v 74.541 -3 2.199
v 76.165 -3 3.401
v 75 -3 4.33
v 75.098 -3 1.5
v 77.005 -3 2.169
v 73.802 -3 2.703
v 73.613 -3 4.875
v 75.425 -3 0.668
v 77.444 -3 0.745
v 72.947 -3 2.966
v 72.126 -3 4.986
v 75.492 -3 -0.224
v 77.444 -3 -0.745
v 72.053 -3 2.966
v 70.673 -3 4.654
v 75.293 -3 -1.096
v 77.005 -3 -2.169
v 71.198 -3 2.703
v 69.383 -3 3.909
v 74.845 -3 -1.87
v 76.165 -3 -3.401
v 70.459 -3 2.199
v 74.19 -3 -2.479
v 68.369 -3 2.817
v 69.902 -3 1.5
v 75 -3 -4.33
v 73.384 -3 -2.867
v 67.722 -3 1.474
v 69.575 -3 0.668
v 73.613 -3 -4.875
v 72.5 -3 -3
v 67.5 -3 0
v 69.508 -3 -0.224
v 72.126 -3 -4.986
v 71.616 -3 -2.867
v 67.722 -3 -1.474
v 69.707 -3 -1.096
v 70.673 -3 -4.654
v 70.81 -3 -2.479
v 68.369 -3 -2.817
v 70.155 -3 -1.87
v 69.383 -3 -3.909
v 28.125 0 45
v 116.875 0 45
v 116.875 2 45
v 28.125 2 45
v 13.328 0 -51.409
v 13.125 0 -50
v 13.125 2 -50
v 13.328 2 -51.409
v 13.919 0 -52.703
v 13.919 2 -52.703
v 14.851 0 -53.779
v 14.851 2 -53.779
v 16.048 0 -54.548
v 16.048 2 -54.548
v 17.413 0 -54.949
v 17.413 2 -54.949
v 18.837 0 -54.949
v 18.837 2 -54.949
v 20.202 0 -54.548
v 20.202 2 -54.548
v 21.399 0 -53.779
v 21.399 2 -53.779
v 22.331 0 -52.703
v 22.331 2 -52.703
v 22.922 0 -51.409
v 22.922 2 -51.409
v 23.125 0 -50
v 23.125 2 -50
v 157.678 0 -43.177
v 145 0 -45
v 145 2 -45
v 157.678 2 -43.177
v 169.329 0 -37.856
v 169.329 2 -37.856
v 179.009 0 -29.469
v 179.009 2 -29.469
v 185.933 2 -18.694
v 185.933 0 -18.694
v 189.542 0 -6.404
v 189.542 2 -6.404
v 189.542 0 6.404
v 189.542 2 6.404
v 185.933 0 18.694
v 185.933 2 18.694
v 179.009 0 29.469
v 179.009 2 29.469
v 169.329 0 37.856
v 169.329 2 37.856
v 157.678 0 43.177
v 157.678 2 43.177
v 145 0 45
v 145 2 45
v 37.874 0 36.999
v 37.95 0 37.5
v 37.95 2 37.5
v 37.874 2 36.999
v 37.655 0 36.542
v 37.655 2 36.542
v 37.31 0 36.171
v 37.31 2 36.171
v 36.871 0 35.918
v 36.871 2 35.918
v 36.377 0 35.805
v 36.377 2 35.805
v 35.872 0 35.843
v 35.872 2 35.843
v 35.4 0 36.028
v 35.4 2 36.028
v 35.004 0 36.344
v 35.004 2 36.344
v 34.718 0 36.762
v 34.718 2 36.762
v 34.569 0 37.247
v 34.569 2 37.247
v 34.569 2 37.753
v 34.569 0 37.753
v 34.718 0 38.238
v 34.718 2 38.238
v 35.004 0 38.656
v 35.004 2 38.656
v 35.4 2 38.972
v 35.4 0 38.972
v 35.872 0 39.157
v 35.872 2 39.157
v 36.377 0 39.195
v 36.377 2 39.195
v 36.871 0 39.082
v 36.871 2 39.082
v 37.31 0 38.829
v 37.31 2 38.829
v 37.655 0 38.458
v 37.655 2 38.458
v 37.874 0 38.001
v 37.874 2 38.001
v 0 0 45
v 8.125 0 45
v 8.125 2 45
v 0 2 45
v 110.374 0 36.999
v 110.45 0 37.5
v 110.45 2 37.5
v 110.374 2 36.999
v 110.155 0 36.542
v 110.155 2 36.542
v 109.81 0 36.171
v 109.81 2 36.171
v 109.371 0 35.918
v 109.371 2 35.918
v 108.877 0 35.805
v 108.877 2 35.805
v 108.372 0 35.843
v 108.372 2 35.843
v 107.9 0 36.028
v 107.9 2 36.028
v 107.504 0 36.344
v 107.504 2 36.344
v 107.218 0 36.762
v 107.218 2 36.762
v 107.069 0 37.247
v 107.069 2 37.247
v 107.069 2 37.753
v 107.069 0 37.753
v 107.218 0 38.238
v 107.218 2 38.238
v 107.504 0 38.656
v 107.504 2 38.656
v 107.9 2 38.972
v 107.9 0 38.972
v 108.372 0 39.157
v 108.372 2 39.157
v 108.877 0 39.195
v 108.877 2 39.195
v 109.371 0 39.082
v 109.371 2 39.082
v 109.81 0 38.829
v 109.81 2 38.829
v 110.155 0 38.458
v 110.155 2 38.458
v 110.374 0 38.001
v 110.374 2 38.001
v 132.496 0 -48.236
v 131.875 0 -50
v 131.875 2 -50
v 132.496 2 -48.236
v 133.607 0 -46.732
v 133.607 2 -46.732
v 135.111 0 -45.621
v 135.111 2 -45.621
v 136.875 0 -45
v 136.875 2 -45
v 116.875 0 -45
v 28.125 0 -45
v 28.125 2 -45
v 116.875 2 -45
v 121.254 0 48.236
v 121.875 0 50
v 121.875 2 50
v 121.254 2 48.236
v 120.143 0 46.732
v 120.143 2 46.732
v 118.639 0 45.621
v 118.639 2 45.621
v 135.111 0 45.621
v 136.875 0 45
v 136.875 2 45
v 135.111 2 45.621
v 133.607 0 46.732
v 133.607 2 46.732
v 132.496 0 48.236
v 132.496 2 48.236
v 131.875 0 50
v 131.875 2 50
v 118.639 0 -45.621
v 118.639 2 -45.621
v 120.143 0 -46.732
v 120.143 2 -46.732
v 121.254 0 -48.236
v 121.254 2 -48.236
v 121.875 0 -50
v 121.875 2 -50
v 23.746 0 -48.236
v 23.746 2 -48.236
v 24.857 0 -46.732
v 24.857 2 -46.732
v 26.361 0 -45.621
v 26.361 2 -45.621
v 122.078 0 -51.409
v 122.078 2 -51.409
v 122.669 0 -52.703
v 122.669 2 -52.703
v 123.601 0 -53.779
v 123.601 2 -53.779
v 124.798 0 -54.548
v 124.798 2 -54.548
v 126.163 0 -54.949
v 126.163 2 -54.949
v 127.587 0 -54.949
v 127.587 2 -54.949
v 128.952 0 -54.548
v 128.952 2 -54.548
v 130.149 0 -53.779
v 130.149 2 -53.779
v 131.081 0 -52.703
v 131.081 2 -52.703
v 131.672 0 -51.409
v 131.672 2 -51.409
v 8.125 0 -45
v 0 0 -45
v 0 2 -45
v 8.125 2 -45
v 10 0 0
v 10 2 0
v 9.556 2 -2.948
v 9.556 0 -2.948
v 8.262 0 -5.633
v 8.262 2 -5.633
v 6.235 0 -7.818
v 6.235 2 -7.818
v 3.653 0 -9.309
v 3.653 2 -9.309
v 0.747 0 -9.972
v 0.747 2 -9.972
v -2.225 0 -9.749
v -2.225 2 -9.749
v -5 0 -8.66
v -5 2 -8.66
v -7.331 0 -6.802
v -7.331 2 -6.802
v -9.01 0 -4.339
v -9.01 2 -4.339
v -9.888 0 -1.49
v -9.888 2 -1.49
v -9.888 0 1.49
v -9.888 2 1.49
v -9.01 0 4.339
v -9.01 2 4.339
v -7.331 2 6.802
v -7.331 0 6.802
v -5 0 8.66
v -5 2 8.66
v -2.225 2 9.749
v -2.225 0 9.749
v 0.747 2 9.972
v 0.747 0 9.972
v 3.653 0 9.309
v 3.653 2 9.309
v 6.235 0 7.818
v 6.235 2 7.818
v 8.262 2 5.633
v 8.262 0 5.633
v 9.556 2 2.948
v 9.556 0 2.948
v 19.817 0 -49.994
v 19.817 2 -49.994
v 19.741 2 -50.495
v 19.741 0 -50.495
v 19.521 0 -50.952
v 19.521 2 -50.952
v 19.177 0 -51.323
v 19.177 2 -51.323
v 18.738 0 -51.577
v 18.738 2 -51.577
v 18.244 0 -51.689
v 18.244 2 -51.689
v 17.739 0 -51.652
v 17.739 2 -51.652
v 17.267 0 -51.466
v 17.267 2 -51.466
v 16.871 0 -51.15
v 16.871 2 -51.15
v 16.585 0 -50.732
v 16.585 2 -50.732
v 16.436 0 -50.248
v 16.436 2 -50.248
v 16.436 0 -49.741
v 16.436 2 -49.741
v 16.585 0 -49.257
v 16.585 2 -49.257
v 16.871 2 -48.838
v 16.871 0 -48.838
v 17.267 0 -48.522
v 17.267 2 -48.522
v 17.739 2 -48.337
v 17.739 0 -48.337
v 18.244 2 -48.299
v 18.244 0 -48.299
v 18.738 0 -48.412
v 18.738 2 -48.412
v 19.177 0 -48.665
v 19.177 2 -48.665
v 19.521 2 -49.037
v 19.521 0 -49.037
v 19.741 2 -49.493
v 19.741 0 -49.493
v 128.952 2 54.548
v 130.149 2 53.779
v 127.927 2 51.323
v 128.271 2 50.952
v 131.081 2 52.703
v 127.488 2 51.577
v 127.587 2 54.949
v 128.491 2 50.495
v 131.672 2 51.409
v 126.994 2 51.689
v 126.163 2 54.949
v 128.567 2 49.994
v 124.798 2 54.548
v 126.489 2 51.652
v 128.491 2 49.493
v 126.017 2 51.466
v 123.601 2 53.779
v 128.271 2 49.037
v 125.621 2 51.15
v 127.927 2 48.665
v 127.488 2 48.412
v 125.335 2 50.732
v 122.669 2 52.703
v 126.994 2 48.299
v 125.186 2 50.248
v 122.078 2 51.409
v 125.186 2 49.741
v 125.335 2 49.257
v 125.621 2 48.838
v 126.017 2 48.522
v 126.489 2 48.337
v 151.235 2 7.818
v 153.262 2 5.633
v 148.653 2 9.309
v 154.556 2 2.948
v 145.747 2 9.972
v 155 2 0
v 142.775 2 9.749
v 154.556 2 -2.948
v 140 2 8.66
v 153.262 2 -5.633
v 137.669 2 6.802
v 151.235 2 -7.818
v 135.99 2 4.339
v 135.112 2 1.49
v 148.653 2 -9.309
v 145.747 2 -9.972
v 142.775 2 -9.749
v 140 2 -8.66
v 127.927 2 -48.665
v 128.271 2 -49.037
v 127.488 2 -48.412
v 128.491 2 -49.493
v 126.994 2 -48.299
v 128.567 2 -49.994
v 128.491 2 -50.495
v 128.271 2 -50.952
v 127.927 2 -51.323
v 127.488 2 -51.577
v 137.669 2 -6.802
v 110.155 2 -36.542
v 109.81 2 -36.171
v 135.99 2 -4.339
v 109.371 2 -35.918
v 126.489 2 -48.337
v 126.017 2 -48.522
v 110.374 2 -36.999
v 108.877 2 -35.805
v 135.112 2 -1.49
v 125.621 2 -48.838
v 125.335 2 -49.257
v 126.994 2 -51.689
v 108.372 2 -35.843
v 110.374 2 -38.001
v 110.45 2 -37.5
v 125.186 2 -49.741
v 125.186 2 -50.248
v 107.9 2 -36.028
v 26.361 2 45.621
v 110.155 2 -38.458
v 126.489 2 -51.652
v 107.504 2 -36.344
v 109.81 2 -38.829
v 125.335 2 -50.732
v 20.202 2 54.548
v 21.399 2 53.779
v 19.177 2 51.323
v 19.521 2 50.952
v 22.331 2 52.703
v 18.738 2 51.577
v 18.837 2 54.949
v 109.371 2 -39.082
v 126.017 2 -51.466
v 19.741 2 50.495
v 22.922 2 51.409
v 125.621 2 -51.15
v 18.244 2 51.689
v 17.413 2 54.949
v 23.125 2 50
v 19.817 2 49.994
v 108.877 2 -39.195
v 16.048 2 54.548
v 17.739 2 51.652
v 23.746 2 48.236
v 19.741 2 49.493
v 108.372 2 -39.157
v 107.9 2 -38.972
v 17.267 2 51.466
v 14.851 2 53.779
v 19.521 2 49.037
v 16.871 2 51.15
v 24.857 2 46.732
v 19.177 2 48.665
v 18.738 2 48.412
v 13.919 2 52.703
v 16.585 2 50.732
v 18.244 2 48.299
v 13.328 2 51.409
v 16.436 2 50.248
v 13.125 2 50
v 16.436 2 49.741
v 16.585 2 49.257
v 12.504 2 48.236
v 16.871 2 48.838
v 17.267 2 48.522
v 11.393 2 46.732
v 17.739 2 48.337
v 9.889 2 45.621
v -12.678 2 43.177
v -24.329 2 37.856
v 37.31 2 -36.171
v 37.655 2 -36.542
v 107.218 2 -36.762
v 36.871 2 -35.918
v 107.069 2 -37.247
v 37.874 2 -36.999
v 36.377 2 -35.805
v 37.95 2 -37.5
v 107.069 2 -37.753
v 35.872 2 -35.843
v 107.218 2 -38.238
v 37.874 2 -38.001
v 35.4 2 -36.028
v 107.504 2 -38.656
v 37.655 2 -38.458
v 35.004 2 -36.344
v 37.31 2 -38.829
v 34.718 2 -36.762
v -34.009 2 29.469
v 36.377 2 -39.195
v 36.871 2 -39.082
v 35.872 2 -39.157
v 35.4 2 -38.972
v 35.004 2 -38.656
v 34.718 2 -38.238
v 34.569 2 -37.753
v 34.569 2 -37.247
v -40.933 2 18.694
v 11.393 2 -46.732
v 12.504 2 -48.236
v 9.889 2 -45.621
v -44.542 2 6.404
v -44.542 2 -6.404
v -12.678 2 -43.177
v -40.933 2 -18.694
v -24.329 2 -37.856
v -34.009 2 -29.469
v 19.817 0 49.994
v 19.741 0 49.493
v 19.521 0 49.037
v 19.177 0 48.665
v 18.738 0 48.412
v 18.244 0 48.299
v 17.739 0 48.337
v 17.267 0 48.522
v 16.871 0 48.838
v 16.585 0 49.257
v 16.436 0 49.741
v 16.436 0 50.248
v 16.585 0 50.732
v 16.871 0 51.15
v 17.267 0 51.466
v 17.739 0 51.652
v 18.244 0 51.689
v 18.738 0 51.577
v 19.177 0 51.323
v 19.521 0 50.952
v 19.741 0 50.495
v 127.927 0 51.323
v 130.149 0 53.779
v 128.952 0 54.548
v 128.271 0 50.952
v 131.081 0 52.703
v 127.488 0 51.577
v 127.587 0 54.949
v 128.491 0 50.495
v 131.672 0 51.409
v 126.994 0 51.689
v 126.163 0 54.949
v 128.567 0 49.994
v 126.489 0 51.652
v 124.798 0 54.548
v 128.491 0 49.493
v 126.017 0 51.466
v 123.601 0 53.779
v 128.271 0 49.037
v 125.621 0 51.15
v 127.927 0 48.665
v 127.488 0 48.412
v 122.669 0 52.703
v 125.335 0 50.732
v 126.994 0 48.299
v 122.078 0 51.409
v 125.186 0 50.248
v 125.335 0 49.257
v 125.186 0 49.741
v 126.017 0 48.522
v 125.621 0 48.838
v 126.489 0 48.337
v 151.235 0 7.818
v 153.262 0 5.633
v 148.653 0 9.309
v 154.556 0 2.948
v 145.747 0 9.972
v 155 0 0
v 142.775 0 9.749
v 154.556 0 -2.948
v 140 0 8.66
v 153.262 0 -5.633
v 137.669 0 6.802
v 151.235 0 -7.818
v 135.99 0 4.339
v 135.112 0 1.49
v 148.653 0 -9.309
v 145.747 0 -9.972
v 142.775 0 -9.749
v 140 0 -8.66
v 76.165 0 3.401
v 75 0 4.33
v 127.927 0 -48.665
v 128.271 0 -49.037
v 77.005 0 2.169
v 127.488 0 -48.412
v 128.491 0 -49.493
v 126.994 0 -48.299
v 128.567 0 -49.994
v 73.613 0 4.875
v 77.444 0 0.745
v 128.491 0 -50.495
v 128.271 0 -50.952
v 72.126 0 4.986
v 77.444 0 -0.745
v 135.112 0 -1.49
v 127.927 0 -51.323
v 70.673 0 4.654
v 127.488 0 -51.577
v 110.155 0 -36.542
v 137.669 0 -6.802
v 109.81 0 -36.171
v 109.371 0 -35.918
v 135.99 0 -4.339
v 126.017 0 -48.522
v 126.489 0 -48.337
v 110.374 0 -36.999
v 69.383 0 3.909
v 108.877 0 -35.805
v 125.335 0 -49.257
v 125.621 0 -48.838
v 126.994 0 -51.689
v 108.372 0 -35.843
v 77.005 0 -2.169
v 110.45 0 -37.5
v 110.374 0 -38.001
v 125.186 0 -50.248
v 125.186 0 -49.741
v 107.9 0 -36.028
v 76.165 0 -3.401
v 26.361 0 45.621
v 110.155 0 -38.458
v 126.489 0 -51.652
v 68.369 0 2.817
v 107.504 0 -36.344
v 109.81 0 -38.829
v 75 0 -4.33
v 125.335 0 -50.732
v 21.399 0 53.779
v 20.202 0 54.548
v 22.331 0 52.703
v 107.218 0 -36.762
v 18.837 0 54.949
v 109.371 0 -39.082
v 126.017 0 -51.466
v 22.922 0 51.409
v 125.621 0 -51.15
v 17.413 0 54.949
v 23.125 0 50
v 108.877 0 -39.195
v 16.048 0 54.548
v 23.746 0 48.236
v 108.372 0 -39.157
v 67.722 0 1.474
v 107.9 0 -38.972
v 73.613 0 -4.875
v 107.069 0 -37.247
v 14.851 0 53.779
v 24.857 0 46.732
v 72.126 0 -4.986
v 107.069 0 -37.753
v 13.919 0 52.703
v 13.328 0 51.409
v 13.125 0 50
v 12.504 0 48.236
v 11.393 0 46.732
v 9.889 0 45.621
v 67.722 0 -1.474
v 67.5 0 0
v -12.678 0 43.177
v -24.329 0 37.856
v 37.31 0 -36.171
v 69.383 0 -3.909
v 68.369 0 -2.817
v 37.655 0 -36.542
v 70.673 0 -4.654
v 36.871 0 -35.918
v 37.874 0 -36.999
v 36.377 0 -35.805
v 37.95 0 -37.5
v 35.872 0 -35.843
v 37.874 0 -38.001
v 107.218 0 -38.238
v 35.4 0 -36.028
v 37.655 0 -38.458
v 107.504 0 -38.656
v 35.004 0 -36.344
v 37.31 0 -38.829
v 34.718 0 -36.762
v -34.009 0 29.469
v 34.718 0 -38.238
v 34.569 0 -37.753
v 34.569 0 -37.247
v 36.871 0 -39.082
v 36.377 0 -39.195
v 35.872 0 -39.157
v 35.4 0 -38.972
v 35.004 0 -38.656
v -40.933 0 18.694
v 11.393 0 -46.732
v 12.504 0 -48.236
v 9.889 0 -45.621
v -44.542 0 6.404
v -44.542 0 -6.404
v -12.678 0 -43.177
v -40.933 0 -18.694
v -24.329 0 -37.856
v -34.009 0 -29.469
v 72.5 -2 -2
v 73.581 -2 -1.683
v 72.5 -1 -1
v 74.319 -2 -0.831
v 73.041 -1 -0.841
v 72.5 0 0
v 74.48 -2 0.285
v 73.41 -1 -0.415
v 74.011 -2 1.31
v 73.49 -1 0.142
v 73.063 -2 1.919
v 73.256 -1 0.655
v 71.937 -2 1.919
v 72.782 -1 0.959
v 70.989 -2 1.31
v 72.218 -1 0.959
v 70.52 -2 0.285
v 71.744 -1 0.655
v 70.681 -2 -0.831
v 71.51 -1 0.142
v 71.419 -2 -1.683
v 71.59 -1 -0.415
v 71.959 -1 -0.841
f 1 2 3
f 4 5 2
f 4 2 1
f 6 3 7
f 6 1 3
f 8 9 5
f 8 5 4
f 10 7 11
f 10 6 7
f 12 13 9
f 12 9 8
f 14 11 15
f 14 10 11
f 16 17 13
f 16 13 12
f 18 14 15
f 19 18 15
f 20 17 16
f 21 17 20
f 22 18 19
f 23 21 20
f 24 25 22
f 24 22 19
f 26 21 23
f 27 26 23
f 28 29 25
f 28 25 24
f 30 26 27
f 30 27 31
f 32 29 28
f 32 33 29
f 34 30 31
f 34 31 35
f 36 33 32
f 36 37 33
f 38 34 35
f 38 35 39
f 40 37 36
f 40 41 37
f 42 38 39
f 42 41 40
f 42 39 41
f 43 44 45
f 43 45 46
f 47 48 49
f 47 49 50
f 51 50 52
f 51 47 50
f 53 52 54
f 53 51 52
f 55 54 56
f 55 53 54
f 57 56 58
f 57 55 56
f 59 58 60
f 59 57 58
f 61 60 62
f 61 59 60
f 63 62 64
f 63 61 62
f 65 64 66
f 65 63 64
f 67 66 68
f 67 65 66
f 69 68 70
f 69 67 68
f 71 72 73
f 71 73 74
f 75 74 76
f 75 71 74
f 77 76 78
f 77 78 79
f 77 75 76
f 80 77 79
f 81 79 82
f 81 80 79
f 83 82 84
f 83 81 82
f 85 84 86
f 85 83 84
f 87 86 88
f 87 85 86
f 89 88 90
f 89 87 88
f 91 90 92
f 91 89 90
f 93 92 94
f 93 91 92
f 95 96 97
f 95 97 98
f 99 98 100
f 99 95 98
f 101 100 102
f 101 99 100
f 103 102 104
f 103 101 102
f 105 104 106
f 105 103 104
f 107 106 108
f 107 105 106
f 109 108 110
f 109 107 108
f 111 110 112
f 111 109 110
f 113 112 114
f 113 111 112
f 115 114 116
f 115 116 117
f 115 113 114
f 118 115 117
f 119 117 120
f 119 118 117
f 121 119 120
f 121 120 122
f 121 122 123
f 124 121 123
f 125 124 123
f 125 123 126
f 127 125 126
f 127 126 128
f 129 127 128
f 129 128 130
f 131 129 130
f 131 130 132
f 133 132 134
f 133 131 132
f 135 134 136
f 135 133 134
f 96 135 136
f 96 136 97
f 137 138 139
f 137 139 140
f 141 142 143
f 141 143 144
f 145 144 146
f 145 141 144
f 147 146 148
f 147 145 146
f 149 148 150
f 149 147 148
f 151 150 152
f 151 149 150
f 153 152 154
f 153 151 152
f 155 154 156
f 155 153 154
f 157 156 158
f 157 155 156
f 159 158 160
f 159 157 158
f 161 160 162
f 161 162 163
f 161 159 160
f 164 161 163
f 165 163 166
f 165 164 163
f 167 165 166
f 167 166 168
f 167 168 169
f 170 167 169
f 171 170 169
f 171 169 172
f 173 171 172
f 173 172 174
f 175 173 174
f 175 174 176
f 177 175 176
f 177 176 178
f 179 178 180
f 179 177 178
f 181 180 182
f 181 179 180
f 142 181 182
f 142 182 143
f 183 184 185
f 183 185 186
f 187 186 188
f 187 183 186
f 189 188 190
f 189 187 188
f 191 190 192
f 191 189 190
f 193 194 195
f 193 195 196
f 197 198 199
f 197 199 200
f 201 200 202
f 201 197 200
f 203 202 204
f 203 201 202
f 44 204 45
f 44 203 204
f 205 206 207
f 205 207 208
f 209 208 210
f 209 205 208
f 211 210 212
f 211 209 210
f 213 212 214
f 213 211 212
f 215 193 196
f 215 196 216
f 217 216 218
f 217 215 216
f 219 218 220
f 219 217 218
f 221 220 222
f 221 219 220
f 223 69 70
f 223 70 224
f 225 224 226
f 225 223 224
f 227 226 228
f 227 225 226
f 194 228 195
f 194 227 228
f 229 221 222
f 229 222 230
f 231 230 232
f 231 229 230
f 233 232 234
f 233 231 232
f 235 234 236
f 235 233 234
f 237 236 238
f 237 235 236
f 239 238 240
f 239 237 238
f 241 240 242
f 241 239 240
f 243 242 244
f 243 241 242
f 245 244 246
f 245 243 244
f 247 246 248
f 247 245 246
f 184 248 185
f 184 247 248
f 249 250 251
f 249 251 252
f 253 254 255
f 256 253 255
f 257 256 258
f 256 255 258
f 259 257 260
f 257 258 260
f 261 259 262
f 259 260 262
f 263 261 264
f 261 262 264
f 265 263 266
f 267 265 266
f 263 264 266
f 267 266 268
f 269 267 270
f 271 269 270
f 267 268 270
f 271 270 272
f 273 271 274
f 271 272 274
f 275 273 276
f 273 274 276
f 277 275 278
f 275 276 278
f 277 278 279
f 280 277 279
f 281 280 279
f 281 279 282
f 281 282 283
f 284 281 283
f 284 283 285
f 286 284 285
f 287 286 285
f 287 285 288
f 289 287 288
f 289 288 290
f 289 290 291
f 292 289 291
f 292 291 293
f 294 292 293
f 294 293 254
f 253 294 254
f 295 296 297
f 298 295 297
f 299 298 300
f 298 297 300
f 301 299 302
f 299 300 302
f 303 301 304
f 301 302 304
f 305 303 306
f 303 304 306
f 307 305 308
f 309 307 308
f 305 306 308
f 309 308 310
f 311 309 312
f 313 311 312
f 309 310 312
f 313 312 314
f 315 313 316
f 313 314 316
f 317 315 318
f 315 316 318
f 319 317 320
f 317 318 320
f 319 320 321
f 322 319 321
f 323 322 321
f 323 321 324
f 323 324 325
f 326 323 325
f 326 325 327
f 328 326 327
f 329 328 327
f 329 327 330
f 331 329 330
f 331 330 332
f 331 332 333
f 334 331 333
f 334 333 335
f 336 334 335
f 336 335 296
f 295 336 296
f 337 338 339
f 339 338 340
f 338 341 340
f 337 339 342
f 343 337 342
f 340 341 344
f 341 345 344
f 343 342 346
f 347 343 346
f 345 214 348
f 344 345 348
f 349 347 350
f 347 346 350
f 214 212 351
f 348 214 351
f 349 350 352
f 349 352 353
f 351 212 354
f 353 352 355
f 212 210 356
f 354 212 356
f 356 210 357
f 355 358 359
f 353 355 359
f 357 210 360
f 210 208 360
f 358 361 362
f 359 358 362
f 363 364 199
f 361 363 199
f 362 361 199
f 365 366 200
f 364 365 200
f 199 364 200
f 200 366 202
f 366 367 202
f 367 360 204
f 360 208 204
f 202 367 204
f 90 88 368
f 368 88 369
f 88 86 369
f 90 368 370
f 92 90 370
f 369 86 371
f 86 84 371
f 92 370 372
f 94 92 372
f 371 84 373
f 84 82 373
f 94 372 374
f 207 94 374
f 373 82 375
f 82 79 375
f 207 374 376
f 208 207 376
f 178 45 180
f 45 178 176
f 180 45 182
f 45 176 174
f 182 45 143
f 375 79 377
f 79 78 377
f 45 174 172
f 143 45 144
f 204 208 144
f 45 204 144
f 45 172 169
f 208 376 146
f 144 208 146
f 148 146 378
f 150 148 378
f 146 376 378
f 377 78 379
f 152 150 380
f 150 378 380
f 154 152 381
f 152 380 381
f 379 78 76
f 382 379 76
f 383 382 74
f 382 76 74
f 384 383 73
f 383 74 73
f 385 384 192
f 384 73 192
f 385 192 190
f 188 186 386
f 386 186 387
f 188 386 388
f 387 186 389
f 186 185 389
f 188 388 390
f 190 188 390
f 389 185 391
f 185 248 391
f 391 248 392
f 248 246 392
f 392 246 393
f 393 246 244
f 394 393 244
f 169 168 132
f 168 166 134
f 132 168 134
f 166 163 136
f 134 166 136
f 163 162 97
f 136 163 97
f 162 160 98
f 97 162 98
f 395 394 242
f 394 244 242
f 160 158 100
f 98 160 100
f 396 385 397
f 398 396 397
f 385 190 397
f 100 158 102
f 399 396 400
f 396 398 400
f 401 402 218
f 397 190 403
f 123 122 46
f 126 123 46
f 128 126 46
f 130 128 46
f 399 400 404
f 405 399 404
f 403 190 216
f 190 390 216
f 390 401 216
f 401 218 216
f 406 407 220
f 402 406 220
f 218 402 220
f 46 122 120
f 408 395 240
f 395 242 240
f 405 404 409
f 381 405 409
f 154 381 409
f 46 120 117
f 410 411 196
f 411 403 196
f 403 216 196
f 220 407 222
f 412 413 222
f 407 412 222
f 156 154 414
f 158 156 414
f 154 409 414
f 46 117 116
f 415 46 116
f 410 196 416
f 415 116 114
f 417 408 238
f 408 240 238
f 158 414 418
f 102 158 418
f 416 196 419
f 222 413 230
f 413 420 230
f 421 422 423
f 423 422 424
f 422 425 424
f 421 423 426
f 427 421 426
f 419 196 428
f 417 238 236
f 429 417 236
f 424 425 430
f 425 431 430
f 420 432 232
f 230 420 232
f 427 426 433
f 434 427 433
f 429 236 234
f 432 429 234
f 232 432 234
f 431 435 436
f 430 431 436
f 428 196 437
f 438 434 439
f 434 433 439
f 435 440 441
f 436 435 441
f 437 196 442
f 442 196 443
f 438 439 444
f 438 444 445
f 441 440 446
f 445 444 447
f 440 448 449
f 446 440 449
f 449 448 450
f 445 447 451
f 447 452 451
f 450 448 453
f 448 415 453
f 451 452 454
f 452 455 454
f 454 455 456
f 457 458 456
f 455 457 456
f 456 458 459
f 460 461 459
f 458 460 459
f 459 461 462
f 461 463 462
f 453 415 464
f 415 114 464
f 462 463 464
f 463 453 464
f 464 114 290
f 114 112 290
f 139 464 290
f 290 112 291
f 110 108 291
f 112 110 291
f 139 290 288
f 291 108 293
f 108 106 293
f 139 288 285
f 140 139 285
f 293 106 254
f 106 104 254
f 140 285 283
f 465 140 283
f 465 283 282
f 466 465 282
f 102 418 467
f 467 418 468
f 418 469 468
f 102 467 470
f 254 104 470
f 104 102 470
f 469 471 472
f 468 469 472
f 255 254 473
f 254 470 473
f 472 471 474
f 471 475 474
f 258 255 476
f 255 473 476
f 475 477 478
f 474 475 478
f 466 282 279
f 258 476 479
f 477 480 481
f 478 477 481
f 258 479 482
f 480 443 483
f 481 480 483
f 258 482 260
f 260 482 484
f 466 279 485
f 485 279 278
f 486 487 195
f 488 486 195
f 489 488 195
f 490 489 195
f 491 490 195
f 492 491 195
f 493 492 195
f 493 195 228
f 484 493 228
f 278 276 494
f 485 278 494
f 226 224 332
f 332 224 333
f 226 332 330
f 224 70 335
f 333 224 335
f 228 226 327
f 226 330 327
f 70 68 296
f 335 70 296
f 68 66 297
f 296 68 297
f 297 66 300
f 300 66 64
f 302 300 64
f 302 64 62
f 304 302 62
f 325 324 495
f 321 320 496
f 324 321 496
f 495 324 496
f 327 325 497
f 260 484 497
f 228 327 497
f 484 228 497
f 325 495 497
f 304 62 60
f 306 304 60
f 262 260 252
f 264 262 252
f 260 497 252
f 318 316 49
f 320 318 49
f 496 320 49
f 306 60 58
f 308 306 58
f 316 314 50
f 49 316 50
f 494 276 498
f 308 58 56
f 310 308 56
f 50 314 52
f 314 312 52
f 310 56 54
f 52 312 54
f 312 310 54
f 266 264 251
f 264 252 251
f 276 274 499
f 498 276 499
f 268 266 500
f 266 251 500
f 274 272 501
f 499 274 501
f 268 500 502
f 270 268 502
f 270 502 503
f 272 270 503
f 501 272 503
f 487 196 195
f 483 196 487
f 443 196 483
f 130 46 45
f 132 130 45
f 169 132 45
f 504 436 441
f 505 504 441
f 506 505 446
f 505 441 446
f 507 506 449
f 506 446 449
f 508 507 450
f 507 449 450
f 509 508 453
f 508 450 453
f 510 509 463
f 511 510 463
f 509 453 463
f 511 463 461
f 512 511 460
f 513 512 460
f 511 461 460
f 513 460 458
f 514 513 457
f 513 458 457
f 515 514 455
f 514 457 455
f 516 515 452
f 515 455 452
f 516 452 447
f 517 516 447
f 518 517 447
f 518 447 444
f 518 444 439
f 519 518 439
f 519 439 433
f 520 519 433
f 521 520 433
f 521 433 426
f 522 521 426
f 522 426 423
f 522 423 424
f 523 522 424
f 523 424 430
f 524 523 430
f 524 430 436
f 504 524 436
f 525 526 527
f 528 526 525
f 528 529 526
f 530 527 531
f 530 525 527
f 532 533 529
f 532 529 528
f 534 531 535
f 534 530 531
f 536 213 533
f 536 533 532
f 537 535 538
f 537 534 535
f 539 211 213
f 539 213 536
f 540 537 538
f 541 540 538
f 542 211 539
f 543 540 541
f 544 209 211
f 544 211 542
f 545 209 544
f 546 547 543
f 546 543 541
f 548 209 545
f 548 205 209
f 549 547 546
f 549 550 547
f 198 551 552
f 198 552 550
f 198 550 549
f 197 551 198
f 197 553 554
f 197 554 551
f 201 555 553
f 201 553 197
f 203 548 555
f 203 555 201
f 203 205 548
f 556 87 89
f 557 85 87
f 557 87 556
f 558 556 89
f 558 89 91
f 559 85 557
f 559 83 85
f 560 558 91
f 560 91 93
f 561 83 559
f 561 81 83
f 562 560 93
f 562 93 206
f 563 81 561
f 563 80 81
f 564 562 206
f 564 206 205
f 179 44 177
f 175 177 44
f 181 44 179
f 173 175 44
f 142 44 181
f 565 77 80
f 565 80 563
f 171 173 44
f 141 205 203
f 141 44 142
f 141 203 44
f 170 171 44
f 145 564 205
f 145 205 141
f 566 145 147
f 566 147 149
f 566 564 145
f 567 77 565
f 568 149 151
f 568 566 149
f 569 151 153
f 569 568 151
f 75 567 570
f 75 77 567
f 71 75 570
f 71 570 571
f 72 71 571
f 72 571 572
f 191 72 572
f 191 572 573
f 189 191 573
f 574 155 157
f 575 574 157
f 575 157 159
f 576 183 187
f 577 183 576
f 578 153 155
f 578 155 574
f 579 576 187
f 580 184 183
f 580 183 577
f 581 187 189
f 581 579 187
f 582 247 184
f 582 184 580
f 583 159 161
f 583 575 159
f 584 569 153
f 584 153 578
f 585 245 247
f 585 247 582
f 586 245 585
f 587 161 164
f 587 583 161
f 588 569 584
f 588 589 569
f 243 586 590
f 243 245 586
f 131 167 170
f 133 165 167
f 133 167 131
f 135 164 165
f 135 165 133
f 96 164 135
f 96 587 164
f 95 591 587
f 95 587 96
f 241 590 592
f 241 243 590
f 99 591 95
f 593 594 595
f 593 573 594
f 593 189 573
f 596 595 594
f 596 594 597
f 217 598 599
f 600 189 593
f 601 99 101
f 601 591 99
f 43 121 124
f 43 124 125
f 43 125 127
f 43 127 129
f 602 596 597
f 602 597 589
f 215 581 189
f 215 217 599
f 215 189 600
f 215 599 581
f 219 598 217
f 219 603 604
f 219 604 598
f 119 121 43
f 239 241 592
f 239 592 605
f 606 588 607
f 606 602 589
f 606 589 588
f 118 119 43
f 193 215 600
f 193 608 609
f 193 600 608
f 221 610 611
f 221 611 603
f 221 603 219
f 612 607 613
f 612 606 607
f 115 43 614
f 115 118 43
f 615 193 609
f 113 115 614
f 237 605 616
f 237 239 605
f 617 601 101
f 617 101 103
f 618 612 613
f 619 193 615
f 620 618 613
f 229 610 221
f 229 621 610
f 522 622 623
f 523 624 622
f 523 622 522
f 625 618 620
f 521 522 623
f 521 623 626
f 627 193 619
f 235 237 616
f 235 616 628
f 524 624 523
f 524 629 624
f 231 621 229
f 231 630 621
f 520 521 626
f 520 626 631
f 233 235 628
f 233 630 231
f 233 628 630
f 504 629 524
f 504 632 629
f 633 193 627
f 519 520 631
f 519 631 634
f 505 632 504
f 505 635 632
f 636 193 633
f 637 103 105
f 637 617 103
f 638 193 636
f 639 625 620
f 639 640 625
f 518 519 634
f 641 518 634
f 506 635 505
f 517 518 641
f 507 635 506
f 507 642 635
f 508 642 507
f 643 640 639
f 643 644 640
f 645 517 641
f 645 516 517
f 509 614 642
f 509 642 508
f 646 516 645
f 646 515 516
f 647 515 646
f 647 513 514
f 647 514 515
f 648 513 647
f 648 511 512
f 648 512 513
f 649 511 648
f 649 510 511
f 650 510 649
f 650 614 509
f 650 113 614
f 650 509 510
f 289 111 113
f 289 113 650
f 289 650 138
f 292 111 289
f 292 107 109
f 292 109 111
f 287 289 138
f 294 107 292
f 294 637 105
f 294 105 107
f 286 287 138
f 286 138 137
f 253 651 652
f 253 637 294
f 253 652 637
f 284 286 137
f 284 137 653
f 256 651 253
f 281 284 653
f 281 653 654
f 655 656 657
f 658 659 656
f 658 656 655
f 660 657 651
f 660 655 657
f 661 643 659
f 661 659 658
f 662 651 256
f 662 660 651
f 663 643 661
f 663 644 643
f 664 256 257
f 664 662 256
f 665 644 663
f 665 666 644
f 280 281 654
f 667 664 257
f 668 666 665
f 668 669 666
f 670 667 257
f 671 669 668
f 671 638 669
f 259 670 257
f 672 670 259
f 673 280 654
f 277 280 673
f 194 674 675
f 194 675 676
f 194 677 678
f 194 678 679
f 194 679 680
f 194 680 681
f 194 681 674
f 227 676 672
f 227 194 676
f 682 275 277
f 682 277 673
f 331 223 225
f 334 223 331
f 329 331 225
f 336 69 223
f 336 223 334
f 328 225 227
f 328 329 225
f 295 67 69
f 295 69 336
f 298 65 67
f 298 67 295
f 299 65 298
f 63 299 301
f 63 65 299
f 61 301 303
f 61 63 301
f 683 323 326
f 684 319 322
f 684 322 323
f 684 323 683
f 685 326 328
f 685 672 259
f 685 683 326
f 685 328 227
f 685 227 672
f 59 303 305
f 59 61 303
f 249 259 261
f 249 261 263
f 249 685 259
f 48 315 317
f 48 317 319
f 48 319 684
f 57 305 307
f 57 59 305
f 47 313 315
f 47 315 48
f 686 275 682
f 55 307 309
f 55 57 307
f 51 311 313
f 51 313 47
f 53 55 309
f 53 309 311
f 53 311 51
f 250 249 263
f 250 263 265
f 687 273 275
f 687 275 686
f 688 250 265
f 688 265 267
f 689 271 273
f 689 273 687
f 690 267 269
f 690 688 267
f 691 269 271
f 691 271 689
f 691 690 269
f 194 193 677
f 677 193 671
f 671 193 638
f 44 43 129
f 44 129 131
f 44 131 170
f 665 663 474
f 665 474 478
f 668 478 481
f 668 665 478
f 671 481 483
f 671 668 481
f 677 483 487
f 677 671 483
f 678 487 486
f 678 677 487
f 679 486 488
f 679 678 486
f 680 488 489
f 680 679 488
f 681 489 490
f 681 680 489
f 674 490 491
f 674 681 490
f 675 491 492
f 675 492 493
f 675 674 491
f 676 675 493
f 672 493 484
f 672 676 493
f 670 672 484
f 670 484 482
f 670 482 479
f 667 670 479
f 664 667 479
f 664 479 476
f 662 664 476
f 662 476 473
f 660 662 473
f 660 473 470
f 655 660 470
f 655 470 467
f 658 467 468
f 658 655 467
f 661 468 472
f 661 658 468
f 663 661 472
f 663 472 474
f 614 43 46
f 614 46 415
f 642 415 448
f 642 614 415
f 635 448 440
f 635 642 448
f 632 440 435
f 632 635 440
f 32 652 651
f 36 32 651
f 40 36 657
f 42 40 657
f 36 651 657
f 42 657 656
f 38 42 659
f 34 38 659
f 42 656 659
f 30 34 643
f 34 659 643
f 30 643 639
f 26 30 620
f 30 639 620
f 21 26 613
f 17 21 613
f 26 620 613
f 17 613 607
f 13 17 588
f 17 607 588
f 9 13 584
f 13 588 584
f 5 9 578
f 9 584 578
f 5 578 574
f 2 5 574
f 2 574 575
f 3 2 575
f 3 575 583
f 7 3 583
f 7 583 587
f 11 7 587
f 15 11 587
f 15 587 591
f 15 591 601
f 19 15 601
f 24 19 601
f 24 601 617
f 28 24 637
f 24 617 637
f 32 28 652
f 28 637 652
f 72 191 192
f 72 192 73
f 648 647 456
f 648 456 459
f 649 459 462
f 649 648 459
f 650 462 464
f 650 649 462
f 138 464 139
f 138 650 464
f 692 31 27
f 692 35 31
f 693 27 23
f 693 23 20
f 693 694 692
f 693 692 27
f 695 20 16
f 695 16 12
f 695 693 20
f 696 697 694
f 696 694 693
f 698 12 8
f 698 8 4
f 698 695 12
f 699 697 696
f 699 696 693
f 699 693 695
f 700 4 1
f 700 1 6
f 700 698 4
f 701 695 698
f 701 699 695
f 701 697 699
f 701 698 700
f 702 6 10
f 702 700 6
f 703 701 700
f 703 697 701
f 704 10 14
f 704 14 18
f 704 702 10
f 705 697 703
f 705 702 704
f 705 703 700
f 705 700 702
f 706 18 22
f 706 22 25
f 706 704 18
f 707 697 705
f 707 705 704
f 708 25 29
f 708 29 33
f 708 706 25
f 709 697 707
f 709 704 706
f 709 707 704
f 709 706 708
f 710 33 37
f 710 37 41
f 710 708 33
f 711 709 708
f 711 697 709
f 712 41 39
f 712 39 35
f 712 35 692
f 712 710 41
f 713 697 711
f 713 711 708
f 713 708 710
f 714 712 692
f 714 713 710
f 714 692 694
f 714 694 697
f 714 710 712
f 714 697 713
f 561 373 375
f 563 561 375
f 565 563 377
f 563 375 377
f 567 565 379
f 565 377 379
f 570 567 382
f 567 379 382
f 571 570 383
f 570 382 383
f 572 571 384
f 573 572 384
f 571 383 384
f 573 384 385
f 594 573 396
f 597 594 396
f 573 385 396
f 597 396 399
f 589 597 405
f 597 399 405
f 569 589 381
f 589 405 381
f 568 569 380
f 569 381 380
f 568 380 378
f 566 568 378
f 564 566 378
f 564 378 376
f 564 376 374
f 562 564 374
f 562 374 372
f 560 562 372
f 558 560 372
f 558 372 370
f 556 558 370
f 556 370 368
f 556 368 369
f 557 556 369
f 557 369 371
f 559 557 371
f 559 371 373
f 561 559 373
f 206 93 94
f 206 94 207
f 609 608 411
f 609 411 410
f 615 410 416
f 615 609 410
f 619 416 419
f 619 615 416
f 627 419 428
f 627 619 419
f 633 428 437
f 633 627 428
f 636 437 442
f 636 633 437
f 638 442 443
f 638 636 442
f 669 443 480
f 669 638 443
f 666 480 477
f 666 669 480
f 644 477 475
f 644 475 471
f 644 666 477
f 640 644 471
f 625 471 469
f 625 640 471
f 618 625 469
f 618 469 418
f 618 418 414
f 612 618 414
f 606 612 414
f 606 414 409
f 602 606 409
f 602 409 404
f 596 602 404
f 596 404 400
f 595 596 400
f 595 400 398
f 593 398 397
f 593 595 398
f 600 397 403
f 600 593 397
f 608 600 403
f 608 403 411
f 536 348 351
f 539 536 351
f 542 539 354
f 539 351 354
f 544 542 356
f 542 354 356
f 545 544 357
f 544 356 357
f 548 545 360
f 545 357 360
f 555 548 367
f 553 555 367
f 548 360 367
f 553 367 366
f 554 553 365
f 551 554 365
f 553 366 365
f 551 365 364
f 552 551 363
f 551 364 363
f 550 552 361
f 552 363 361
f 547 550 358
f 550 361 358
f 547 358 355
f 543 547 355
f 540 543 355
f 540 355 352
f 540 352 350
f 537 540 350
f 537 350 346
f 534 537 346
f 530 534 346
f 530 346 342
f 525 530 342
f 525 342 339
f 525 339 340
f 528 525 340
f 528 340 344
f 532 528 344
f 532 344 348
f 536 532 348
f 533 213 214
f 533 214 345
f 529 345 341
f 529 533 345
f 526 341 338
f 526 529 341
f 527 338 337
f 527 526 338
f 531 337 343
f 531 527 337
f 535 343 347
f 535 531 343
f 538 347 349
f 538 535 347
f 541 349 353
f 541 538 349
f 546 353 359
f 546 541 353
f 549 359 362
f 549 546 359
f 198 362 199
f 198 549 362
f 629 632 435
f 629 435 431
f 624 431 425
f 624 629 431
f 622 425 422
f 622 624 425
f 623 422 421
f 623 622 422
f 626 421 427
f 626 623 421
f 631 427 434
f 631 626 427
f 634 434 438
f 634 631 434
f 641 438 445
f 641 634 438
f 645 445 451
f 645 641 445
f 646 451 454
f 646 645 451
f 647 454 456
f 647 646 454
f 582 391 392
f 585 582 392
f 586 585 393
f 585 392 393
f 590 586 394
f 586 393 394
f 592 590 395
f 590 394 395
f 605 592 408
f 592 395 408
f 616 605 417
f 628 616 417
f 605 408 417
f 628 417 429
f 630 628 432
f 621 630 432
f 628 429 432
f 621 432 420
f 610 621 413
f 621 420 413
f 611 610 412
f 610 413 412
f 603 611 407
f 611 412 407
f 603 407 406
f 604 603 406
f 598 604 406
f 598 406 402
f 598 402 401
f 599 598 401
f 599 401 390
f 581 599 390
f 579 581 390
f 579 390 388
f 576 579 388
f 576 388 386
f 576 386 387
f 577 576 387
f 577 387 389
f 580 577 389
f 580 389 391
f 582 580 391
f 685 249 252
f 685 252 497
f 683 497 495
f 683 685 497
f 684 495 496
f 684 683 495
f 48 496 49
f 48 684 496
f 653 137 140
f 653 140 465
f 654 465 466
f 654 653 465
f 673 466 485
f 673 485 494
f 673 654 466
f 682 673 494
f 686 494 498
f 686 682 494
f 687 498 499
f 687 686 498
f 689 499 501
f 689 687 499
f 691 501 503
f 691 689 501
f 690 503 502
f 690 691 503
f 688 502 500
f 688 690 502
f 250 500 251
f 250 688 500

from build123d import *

# Parameters (mm, degrees)
SKETCH1_R           = 1.7
BOSS_EXTRUDE1_DEPTH = 2
SKETCH2_R           = 1.7
CUT_EXTRUDE1_DEPTH  = 4
SKETCH5_R           = 10
CUT_EXTRUDE2_DEPTH  = 10
SKETCH7_R           = 5
BOSS_EXTRUDE3_DEPTH = 3


with BuildPart() as part:
    # Sketch1 → Boss-Extrude1 (new body)
    with BuildSketch(Plane(origin=(0, 0, 0), x_dir=(1, 0, 0), z_dir=(0, 1, 0))):
        with BuildLine():
            Line((0, 45), (8.125, 45))
            ThreePointArc((8.125, 45), (11.393102806, 46.731897194), (13.125, 50))
            ThreePointArc((13.125, 50), (18.125, 55), (23.125, 50))
            ThreePointArc((23.125, 50), (24.856897194, 46.731897194), (28.125, 45))
            Line((28.125, 45), (116.875, 45))
            ThreePointArc((116.875, 45), (120.143102806, 46.731897194), (121.875, 50))
            ThreePointArc((121.875, 50), (126.875, 55), (131.875, 50))
            ThreePointArc((131.875, 50), (133.606897194, 46.731897194), (136.875, 45))
            Line((136.875, 45), (145, 45))
            ThreePointArc((145, 45), (190, 0), (145, -45))
            Line((145, -45), (136.875, -45))
            ThreePointArc((136.875, -45), (133.606897194, -46.731897194), (131.875, -50))
            ThreePointArc((131.875, -50), (126.875, -55), (121.875, -50))
            ThreePointArc((121.875, -50), (120.143102806, -46.731897194), (116.875, -45))
            Line((116.875, -45), (28.125, -45))
            ThreePointArc((28.125, -45), (24.856897194, -46.731897194), (23.125, -50))
            ThreePointArc((23.125, -50), (18.125, -55), (13.125, -50))
            ThreePointArc((13.125, -50), (11.393102806, -46.731897194), (8.125, -45))
            Line((8.125, -45), (0, -45))
            ThreePointArc((0, -45), (-45, 0), (0, 45))
        make_face()
        with Locations((108.75, -37.5)):
            Circle(SKETCH1_R, mode=Mode.SUBTRACT)
        with Locations((36.25, -37.5)):
            Circle(SKETCH1_R, mode=Mode.SUBTRACT)
        with Locations((36.25, 37.5)):
            Circle(SKETCH1_R, mode=Mode.SUBTRACT)
        with Locations((108.75, 37.5)):
            Circle(SKETCH1_R, mode=Mode.SUBTRACT)
    extrude(amount=BOSS_EXTRUDE1_DEPTH)

    # Sketch2 → Cut-Extrude1 (cut)
    with BuildSketch(Plane(origin=(0, 2, 0), x_dir=(1, 0, 0), z_dir=(0, 1, 0))):
        with Locations((18.11681751, -49.994200378)):
            Circle(SKETCH2_R)
        with Locations((126.86681751, -49.994200378)):
            Circle(SKETCH2_R)
        with Locations((126.86681751, 49.994200378)):
            Circle(SKETCH2_R)
        with Locations((18.11681751, 49.994200378)):
            Circle(SKETCH2_R)
    extrude(amount=-CUT_EXTRUDE1_DEPTH, mode=Mode.SUBTRACT)

    # Sketch5 → Cut-Extrude2 (cut)
    with BuildSketch(Plane(origin=(0, 2, 0), x_dir=(1, 0, 0), z_dir=(0, 1, 0))):
        Circle(SKETCH5_R)
        with Locations((145, 0)):
            Circle(SKETCH5_R)
    extrude(amount=-CUT_EXTRUDE2_DEPTH, mode=Mode.SUBTRACT)

    # Sketch7 → Boss-Extrude3 (add)
    with BuildSketch(Plane(origin=(0, 0, 0), x_dir=(-1, 0, 0), z_dir=(0, -1, 0))):
        with Locations((-72.5, 0)):
            Circle(SKETCH7_R)
    extrude(amount=BOSS_EXTRUDE3_DEPTH)

    # Sketch9 → Cut-Revolve1 (revolve, cut)
    with BuildSketch(Plane.ZY.offset(-72.5)):
        Polygon((0, 0), (0, -3), (-3, -3), align=None)
    revolve(axis=Axis((72.5, 0, 0), (0, -1, 0)), mode=Mode.SUBTRACT)


solid = part.part
